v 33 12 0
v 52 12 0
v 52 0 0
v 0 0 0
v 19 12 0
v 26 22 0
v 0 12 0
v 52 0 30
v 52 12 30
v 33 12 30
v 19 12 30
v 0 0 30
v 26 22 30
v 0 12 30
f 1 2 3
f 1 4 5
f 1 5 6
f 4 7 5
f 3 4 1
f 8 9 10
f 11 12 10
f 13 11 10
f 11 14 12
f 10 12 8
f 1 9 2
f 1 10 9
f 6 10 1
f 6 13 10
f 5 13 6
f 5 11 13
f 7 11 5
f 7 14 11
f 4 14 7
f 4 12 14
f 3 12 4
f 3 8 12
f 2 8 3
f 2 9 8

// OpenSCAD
$fn = 32;

// ----------------------------------------------------------------------
// V guide rail: vrib, 52 mm wide
// ----------------------------------------------------------------------

// --- parameters (mm) ---
rail_w = 52;              // rail width, X
base_t = 12;              // base plate thickness
v_depth = 10;             // V feature depth / height
v_half_w = 7;             // half width of the V at the base face
plate_t = 30;             // rail length, Z (the extrusion height)

profile = [[0, 0], [52, 0], [52, 12], [33, 12], [26, 22], [19, 12], [0, 12]];  // primary outline, 7 points, counter clockwise

// --- the one profile operation ---
linear_extrude(height = plate_t) polygon(points = profile);
